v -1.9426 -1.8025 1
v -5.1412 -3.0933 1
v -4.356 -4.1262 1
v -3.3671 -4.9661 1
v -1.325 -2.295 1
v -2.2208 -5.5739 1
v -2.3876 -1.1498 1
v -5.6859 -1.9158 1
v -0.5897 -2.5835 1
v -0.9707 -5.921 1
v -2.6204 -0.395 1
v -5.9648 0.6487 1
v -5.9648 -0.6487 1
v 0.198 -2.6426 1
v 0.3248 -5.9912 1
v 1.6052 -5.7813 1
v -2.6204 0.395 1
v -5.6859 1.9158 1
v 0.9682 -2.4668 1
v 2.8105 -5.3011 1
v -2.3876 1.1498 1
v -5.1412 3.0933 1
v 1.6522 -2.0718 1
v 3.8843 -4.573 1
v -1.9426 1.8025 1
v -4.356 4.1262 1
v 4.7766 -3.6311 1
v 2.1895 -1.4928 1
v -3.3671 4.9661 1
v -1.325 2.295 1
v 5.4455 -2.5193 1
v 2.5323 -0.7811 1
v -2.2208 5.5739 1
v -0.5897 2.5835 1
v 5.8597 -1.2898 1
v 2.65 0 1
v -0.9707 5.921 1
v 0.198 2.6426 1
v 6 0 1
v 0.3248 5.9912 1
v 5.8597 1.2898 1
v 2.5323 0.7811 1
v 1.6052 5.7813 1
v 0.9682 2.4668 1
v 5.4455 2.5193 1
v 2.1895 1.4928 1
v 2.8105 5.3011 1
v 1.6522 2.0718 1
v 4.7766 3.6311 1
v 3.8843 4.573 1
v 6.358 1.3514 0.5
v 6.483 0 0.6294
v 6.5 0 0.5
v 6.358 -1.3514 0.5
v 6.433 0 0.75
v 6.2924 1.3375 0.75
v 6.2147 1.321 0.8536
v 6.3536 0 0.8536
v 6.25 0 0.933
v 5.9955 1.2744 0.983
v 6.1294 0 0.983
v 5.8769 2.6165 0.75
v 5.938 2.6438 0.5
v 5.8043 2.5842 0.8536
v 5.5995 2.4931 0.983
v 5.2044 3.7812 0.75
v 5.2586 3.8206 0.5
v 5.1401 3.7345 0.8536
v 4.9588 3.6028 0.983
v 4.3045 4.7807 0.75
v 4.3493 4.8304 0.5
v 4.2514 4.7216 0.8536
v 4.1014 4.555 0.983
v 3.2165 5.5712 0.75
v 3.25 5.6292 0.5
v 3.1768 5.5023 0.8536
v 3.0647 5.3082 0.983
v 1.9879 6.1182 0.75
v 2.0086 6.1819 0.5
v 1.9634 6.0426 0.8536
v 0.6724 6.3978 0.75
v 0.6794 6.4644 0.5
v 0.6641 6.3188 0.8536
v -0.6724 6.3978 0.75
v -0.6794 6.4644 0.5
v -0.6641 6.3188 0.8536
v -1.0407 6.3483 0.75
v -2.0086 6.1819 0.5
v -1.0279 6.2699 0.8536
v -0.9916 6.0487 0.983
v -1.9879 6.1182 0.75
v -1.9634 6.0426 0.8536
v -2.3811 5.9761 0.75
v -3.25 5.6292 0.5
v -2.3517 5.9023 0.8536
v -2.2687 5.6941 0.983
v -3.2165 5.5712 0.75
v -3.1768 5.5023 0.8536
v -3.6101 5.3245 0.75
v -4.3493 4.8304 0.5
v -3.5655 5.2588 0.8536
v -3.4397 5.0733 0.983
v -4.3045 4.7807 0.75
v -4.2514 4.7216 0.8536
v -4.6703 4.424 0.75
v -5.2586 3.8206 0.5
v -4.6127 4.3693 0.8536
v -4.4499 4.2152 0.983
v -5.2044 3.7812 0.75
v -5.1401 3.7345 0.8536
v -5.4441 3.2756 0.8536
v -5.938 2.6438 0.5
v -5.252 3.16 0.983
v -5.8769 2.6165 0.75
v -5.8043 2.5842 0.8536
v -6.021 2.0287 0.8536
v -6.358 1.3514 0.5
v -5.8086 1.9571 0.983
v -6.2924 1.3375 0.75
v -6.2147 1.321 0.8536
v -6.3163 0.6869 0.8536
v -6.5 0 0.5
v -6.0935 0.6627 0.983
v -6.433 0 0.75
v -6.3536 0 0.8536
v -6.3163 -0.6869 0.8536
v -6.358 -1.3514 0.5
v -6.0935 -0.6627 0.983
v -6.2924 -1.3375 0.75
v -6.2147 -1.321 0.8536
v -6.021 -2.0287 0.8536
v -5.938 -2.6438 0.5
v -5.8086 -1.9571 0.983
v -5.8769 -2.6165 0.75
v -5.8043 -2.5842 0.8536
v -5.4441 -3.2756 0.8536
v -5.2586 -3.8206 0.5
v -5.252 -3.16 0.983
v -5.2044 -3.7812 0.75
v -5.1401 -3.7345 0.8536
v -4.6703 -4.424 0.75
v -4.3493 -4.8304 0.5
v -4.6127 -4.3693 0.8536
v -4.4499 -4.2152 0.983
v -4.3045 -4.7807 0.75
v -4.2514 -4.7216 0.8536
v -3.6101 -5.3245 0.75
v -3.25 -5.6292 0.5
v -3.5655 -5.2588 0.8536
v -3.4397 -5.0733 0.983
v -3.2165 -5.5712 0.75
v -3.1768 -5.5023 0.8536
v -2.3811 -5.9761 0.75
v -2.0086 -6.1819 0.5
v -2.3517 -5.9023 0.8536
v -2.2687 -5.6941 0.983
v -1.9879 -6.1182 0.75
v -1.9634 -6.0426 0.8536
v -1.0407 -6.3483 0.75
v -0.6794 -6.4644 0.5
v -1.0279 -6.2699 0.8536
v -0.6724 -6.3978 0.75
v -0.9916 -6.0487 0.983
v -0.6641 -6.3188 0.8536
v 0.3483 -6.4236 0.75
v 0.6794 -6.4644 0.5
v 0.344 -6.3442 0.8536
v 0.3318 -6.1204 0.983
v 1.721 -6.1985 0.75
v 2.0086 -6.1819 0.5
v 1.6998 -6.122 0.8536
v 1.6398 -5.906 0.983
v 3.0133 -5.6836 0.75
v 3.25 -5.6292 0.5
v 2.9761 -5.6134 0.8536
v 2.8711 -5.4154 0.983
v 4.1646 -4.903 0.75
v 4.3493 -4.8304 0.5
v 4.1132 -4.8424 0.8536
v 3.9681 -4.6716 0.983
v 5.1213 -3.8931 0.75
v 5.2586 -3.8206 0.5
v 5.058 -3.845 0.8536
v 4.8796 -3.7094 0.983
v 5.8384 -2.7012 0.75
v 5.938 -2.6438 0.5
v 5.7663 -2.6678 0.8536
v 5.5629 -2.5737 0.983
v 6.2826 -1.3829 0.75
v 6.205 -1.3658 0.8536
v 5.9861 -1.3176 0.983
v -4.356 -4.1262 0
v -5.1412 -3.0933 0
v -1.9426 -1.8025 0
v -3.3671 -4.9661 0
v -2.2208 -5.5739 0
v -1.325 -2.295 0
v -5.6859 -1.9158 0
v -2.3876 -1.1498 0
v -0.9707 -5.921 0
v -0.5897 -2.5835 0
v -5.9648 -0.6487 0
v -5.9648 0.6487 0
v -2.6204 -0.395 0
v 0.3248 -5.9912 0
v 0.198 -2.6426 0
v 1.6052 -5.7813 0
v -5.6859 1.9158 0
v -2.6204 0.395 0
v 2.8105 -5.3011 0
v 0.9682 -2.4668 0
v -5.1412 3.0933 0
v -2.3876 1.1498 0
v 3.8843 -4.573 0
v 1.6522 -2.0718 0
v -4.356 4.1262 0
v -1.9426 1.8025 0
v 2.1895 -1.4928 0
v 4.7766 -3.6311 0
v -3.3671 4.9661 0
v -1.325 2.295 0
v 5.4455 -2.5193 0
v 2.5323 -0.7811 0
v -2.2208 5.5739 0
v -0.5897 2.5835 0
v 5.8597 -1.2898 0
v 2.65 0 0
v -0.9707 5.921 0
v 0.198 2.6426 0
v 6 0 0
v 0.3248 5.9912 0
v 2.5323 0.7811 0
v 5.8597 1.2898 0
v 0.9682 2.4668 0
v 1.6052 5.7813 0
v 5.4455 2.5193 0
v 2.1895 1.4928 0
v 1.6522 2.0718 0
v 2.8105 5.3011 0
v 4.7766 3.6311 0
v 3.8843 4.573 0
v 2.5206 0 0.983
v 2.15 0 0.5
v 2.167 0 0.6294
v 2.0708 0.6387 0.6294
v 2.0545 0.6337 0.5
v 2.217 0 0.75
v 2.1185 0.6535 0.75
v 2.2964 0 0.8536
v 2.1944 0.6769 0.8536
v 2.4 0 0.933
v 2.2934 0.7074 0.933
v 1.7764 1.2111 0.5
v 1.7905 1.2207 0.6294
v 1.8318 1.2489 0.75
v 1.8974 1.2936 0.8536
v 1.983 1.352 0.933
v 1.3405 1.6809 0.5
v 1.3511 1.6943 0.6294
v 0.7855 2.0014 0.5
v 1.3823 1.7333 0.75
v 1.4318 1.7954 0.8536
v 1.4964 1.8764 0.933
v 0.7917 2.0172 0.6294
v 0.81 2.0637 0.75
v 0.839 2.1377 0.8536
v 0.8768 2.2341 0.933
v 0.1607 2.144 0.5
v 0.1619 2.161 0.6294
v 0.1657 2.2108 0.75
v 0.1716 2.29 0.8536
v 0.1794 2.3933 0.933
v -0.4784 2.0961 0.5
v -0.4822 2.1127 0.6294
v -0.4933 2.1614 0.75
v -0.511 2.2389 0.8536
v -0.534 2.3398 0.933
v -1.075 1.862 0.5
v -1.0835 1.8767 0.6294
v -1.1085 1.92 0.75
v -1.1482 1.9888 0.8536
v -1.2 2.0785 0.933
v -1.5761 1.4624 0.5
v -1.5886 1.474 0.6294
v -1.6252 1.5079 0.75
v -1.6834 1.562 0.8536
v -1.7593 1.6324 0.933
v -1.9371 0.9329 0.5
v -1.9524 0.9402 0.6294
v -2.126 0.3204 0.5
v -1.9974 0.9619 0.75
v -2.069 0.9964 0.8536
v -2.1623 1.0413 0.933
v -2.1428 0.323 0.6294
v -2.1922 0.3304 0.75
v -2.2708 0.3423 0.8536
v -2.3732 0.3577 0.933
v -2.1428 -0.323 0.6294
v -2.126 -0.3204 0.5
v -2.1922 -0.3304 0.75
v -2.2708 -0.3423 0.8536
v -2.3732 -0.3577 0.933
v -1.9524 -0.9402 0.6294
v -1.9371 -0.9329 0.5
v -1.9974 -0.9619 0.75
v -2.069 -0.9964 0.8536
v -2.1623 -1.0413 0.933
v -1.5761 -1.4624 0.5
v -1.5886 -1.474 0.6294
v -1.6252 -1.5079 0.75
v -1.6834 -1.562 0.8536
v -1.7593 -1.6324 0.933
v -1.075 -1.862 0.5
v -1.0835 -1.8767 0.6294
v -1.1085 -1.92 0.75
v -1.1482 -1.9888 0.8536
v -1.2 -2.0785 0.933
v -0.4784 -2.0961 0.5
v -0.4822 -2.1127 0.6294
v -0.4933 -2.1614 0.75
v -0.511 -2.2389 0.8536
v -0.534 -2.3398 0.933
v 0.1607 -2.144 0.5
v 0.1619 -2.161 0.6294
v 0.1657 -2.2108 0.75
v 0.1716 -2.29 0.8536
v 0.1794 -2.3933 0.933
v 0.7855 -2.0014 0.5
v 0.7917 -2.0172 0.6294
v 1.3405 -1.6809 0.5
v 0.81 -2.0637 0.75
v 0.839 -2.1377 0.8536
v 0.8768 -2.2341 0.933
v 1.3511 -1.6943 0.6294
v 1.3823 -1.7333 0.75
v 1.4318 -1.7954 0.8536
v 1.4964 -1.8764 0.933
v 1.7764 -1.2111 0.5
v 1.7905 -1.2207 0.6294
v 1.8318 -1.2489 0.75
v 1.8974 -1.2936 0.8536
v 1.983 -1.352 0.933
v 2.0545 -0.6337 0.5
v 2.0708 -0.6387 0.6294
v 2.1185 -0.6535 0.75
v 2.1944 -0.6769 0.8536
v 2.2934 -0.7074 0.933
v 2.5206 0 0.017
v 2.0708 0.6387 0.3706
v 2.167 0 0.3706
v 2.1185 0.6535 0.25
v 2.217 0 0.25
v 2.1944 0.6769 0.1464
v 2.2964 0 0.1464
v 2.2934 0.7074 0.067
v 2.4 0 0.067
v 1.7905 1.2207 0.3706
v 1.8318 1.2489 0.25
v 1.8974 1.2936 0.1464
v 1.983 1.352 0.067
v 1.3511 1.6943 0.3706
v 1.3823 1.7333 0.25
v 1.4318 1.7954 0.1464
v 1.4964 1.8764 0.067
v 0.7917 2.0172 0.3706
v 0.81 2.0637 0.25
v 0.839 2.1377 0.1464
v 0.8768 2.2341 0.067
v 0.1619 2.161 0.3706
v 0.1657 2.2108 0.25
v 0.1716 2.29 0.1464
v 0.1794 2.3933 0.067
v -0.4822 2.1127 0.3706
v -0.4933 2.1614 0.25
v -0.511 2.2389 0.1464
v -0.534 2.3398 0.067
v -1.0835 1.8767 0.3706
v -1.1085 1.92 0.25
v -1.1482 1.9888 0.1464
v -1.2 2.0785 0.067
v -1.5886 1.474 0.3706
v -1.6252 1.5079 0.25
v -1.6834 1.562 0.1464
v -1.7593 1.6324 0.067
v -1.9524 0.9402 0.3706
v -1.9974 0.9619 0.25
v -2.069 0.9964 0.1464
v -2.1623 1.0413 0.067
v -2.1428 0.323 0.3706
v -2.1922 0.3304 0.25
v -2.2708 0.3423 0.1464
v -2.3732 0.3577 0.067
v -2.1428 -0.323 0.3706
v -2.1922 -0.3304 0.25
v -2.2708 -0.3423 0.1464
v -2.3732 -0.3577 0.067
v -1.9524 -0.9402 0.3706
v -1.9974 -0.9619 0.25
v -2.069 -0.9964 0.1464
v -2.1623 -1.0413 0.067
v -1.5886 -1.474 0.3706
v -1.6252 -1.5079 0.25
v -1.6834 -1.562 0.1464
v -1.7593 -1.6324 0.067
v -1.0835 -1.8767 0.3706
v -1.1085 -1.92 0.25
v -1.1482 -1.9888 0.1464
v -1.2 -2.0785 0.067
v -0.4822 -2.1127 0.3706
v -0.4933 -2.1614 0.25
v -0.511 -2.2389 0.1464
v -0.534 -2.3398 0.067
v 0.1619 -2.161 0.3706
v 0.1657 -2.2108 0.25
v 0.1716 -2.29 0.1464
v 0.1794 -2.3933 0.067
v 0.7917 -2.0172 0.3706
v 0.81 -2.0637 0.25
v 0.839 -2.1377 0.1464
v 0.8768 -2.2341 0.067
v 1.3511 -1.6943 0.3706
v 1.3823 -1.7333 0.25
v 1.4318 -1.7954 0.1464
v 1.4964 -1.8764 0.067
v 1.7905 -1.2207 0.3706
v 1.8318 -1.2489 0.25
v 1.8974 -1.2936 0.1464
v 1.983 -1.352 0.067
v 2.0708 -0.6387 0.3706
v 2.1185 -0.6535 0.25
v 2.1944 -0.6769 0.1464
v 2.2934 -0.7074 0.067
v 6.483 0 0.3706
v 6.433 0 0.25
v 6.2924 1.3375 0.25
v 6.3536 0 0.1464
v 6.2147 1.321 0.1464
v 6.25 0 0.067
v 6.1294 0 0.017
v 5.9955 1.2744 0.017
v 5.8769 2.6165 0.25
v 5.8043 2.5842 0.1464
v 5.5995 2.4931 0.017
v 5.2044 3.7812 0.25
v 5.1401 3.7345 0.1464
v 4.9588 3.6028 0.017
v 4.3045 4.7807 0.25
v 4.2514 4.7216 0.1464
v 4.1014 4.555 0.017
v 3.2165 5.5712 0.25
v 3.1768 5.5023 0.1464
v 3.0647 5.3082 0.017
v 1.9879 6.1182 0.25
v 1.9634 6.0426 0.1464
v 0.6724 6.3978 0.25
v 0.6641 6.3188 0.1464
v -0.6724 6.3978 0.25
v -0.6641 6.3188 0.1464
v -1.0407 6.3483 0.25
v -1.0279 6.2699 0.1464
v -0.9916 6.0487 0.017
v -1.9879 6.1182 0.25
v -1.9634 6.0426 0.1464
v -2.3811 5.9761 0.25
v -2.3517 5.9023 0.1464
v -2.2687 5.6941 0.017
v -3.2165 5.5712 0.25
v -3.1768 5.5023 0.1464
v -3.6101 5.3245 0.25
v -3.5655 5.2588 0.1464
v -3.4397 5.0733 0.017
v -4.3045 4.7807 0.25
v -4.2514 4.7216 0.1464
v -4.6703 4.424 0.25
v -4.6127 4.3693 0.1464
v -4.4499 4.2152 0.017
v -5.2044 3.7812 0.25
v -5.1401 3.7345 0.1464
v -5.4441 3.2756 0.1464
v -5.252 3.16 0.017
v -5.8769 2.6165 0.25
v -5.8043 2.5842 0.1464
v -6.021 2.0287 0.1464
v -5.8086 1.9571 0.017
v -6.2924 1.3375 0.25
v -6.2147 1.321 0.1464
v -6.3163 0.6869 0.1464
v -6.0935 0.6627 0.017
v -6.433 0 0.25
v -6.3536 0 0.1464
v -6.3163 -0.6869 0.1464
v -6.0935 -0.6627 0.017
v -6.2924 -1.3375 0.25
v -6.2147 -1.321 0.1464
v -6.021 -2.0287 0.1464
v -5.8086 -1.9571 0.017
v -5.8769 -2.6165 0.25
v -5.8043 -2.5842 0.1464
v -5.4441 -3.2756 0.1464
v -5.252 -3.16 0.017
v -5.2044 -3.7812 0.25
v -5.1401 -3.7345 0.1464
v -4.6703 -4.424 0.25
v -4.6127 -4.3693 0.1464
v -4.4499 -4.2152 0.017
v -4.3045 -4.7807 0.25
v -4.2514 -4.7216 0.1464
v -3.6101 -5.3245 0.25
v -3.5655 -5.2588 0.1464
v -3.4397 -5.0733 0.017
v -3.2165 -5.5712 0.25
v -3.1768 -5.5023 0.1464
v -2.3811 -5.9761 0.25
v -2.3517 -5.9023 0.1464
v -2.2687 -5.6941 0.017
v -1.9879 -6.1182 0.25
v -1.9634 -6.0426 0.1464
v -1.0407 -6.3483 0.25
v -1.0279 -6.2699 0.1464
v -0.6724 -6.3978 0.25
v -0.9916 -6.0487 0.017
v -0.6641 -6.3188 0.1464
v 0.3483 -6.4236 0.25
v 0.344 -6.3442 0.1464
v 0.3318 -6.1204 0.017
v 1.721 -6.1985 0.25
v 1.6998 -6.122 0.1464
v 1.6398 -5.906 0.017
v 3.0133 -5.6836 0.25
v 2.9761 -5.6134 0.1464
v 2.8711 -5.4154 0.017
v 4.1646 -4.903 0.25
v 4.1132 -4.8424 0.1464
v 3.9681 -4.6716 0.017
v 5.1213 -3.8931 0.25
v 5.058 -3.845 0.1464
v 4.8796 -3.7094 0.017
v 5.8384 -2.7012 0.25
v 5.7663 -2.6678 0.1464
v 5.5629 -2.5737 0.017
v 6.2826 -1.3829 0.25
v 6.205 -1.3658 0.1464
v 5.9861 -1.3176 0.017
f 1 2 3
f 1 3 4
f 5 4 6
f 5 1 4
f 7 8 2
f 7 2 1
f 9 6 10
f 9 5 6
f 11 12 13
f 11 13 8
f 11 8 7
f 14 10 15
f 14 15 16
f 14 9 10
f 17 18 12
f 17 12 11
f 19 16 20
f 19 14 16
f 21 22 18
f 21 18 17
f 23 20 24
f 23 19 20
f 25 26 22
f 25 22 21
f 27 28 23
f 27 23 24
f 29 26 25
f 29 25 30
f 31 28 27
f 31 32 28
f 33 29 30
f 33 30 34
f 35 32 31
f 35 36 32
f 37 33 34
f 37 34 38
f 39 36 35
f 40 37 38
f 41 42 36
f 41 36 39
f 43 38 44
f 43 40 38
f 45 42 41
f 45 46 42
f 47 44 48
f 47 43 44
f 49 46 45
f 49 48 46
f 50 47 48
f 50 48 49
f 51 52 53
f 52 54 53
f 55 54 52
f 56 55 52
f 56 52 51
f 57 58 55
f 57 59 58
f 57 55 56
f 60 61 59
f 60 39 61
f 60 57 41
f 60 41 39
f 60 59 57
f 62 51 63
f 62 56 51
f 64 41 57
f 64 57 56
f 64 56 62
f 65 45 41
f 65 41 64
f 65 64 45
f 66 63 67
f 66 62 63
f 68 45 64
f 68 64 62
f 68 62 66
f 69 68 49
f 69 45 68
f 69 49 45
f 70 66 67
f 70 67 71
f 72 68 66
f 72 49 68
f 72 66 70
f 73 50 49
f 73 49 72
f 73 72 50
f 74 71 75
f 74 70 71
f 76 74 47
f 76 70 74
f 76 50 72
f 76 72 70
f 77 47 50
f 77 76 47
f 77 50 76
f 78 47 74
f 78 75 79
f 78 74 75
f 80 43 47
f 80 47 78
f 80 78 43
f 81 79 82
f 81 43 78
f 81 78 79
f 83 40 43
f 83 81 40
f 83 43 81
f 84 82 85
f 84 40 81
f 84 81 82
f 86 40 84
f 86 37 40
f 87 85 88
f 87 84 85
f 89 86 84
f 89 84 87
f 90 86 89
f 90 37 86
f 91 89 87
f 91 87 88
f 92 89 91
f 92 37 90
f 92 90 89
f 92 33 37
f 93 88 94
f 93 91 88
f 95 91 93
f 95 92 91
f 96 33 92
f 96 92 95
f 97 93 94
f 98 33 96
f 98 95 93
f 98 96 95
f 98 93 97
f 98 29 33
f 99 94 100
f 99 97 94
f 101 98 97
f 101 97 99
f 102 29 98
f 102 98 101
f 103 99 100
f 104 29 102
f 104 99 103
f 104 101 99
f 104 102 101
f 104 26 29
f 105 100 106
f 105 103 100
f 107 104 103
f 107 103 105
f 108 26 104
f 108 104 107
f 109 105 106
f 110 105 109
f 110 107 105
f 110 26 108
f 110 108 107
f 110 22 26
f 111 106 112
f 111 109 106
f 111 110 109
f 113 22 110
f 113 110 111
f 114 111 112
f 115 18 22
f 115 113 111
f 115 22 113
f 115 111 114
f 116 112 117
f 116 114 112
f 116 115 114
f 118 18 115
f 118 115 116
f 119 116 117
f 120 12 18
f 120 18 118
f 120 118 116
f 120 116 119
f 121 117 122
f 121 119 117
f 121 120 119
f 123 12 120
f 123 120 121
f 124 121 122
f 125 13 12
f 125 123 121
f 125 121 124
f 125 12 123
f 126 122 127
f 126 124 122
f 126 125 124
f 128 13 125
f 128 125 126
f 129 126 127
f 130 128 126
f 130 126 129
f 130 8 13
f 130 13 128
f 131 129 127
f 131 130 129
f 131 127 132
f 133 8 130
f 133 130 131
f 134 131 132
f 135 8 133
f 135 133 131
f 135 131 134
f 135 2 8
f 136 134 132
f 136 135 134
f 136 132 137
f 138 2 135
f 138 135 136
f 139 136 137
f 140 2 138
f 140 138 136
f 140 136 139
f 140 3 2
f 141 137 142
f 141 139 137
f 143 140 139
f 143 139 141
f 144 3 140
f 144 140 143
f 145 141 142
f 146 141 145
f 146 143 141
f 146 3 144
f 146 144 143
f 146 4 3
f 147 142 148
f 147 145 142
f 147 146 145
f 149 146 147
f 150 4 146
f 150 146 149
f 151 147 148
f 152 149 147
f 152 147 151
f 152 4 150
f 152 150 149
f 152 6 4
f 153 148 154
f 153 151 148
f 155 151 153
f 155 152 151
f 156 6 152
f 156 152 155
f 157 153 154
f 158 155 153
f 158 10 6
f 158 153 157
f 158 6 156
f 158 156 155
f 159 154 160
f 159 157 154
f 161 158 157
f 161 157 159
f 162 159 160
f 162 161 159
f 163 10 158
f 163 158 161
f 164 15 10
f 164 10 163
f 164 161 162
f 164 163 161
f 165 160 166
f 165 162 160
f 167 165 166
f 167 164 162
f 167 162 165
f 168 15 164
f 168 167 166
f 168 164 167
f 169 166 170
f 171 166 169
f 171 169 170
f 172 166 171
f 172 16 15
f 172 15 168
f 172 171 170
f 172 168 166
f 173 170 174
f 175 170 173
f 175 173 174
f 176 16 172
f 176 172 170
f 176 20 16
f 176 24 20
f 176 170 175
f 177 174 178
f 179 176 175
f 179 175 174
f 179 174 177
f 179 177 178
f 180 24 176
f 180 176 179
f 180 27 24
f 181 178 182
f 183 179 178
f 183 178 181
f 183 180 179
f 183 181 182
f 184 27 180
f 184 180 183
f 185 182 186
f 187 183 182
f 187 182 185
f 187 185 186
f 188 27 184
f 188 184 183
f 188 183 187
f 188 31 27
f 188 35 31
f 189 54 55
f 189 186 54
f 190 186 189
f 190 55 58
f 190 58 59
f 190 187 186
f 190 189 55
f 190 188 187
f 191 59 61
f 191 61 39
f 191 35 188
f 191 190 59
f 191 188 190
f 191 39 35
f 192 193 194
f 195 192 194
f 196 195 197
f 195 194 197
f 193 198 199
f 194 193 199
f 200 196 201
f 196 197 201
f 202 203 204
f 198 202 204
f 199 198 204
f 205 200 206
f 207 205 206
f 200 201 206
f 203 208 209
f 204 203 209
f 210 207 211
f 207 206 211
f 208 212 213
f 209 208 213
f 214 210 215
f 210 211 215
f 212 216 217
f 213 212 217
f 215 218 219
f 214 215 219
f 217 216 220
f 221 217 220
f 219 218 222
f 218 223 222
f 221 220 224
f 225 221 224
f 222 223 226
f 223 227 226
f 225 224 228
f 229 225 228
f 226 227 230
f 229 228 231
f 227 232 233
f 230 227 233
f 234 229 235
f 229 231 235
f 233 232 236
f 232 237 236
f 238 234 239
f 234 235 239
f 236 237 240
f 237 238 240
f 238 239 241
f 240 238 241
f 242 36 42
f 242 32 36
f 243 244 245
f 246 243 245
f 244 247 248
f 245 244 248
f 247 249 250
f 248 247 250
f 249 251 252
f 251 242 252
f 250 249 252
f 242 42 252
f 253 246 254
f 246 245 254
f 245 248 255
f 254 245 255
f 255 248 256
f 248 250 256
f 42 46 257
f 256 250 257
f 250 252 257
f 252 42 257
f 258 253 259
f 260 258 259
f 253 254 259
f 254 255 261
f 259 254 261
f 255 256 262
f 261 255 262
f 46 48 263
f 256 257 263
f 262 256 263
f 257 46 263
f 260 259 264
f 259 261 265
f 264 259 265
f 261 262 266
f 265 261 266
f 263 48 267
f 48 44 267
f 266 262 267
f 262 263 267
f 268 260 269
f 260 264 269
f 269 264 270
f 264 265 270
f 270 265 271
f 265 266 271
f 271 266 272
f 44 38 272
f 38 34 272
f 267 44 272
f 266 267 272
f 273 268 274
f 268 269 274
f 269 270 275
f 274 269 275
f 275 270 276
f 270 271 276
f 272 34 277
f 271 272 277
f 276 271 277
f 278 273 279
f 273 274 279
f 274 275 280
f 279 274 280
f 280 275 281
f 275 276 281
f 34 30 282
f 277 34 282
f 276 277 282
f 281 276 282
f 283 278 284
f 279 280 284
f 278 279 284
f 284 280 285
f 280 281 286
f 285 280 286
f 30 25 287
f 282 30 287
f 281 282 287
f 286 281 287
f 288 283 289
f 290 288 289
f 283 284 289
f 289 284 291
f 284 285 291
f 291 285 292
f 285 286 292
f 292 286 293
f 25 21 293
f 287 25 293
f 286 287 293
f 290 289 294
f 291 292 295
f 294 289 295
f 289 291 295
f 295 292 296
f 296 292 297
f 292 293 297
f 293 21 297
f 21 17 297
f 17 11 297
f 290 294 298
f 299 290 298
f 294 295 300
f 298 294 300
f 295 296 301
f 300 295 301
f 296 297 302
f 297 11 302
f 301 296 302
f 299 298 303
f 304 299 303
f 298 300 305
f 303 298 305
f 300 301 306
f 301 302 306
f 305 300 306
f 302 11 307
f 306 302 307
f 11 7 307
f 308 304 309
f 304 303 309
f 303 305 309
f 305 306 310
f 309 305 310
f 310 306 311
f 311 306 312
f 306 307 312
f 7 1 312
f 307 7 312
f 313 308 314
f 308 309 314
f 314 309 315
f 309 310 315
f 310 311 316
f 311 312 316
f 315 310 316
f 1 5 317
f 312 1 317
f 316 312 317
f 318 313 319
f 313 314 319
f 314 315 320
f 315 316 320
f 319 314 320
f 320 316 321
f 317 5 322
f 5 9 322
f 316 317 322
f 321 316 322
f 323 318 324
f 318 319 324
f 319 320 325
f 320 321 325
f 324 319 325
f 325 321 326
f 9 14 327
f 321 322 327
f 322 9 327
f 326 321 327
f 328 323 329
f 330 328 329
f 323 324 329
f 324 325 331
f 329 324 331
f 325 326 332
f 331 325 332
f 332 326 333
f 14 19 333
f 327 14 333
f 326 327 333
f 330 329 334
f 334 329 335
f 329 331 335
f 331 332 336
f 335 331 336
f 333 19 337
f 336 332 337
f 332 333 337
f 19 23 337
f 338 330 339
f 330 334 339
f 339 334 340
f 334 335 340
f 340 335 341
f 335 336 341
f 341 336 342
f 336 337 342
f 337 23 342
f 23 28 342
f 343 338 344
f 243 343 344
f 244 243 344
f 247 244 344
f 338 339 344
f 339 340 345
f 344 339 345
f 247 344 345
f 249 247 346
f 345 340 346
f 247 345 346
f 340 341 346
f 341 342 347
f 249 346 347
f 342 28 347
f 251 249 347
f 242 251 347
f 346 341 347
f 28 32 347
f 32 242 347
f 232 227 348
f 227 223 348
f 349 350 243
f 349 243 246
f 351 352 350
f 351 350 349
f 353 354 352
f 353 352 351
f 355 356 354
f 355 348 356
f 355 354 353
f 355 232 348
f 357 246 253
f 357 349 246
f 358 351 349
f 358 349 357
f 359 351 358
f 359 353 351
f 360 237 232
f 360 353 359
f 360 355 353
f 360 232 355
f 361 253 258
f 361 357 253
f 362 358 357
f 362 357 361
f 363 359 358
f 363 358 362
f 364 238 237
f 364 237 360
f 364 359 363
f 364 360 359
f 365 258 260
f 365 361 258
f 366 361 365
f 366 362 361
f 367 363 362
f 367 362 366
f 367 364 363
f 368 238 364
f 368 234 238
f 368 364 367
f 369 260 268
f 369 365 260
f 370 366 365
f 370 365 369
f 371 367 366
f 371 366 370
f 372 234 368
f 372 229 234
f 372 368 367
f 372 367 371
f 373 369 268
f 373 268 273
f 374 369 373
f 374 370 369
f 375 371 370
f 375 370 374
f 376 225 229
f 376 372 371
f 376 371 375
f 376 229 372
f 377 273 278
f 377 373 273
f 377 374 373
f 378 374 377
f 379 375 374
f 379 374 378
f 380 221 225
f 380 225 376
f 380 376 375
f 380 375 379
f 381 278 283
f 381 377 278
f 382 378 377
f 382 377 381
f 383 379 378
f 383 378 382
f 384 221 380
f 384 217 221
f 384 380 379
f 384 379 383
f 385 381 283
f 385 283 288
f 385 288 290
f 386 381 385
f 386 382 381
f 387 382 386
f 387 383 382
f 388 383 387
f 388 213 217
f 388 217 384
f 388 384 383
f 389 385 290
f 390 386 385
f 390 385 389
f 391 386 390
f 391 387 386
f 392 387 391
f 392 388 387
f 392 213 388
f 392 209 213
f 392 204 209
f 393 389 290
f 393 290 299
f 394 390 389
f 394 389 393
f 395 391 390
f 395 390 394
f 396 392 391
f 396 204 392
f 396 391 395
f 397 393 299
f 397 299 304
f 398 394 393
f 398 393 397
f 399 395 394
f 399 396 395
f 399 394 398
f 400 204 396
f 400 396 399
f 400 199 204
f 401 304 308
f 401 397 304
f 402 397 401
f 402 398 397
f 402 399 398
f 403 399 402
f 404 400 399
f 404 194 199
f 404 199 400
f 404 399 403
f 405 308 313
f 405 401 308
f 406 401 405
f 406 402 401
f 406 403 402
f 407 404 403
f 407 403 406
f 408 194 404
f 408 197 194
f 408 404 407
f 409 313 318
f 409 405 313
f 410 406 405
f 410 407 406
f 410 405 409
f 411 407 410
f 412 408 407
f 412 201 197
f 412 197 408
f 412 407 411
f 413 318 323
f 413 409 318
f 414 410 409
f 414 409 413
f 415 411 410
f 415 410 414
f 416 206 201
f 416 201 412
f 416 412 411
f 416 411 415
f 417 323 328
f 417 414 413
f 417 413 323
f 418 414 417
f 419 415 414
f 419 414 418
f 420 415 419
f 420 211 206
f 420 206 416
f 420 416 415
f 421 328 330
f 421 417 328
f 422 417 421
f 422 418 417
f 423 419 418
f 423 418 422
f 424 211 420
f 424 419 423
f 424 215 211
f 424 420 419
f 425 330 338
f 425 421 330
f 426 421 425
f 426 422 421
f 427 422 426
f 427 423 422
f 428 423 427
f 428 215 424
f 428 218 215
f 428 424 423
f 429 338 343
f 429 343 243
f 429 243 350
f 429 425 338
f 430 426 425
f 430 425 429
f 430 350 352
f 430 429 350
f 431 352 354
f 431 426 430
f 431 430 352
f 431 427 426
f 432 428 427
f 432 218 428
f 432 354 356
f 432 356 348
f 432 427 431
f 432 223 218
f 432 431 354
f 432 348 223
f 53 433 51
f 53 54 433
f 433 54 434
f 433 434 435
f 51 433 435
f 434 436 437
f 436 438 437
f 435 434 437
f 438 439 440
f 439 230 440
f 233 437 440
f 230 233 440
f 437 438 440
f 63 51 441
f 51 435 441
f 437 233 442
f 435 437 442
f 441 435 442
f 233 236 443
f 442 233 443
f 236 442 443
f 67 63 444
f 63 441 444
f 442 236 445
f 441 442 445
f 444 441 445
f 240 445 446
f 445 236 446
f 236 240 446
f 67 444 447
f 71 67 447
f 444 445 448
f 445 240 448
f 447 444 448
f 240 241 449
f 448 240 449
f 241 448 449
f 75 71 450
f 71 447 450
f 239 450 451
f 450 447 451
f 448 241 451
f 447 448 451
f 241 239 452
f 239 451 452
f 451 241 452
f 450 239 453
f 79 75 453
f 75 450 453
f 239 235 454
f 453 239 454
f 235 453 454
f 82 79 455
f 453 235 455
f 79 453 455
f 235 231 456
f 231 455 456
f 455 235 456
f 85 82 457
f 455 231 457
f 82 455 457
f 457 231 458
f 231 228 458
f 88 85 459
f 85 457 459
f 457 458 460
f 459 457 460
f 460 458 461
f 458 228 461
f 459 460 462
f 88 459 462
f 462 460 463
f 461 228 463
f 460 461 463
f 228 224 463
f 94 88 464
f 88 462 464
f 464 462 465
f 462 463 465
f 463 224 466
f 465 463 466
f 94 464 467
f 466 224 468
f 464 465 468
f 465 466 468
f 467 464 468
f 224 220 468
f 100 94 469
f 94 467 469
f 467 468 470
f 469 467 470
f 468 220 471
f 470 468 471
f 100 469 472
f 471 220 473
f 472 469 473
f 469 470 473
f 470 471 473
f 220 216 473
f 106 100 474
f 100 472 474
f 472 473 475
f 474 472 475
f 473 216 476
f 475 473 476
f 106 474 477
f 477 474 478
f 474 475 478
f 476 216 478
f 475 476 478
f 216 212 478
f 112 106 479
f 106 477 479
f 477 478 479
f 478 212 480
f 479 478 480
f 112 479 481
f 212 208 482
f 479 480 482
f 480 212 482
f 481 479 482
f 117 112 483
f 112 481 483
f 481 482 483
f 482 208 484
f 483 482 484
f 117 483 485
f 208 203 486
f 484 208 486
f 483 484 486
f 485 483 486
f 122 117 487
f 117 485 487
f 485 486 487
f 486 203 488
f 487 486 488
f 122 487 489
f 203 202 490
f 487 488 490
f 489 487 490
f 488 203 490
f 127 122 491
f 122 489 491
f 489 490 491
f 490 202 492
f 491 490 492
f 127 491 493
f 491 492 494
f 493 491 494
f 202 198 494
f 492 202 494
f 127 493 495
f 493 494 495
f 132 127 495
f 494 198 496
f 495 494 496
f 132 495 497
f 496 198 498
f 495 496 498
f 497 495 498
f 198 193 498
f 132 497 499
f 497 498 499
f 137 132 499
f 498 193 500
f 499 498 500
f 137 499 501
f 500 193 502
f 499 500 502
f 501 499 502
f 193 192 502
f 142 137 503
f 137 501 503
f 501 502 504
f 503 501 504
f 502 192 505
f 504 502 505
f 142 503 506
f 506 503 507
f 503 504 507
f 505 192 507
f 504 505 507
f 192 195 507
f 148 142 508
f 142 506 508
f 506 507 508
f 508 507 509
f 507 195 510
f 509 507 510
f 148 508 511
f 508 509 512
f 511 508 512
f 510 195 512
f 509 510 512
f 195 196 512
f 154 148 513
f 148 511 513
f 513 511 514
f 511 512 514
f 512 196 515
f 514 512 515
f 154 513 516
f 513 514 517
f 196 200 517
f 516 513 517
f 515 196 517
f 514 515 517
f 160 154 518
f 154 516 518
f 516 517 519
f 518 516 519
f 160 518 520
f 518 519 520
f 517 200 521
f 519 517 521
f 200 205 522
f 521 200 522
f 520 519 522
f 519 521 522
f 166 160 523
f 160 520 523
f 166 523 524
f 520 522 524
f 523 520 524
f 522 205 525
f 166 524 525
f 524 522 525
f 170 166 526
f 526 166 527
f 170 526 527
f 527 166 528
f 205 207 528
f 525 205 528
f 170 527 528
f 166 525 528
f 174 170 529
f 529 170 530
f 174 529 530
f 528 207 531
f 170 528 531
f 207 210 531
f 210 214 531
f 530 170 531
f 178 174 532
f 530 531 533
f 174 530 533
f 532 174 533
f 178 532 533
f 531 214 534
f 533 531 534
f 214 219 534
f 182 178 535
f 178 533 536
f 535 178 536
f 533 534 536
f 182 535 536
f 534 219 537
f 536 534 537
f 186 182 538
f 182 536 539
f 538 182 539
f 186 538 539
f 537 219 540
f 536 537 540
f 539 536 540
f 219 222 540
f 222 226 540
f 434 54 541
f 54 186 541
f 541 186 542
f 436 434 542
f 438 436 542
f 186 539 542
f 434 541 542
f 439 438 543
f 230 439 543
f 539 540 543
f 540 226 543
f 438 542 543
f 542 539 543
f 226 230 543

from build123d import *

# Parameters (mm, degrees)
F0_R     = 6.5
F0_R_2   = 2.15
F1_DEPTH = 1
F2_R     = 0.49999


# Not quite as in the source:
# - a fillet or chamfer is up to 0.001 mm smaller than in the source, because OpenCascade refuses the exact size


with BuildPart() as f1:
    # F0 (on Top) → F1 (new body)
    with BuildSketch(Plane.XY):
        Circle(F0_R)
        Circle(F0_R_2, mode=Mode.SUBTRACT)
    extrude(amount=F1_DEPTH)

    # F2 (radius 0.5 in the source; OpenCascade refuses exactly that, so slightly less here)
    f2_edges = [f1.edges().sort_by_distance(p)[0] for p in [
        (-6.5, 0, 1),
        (-2.15, 0, 1),
        (6.5, 0, 0.5),
        (-6.5, 0, 0),
        (-2.15, 0, 0),
        (2.15, 0, 0.5),
    ]]
    fillet(f2_edges, radius=F2_R)


solid = f1.part
